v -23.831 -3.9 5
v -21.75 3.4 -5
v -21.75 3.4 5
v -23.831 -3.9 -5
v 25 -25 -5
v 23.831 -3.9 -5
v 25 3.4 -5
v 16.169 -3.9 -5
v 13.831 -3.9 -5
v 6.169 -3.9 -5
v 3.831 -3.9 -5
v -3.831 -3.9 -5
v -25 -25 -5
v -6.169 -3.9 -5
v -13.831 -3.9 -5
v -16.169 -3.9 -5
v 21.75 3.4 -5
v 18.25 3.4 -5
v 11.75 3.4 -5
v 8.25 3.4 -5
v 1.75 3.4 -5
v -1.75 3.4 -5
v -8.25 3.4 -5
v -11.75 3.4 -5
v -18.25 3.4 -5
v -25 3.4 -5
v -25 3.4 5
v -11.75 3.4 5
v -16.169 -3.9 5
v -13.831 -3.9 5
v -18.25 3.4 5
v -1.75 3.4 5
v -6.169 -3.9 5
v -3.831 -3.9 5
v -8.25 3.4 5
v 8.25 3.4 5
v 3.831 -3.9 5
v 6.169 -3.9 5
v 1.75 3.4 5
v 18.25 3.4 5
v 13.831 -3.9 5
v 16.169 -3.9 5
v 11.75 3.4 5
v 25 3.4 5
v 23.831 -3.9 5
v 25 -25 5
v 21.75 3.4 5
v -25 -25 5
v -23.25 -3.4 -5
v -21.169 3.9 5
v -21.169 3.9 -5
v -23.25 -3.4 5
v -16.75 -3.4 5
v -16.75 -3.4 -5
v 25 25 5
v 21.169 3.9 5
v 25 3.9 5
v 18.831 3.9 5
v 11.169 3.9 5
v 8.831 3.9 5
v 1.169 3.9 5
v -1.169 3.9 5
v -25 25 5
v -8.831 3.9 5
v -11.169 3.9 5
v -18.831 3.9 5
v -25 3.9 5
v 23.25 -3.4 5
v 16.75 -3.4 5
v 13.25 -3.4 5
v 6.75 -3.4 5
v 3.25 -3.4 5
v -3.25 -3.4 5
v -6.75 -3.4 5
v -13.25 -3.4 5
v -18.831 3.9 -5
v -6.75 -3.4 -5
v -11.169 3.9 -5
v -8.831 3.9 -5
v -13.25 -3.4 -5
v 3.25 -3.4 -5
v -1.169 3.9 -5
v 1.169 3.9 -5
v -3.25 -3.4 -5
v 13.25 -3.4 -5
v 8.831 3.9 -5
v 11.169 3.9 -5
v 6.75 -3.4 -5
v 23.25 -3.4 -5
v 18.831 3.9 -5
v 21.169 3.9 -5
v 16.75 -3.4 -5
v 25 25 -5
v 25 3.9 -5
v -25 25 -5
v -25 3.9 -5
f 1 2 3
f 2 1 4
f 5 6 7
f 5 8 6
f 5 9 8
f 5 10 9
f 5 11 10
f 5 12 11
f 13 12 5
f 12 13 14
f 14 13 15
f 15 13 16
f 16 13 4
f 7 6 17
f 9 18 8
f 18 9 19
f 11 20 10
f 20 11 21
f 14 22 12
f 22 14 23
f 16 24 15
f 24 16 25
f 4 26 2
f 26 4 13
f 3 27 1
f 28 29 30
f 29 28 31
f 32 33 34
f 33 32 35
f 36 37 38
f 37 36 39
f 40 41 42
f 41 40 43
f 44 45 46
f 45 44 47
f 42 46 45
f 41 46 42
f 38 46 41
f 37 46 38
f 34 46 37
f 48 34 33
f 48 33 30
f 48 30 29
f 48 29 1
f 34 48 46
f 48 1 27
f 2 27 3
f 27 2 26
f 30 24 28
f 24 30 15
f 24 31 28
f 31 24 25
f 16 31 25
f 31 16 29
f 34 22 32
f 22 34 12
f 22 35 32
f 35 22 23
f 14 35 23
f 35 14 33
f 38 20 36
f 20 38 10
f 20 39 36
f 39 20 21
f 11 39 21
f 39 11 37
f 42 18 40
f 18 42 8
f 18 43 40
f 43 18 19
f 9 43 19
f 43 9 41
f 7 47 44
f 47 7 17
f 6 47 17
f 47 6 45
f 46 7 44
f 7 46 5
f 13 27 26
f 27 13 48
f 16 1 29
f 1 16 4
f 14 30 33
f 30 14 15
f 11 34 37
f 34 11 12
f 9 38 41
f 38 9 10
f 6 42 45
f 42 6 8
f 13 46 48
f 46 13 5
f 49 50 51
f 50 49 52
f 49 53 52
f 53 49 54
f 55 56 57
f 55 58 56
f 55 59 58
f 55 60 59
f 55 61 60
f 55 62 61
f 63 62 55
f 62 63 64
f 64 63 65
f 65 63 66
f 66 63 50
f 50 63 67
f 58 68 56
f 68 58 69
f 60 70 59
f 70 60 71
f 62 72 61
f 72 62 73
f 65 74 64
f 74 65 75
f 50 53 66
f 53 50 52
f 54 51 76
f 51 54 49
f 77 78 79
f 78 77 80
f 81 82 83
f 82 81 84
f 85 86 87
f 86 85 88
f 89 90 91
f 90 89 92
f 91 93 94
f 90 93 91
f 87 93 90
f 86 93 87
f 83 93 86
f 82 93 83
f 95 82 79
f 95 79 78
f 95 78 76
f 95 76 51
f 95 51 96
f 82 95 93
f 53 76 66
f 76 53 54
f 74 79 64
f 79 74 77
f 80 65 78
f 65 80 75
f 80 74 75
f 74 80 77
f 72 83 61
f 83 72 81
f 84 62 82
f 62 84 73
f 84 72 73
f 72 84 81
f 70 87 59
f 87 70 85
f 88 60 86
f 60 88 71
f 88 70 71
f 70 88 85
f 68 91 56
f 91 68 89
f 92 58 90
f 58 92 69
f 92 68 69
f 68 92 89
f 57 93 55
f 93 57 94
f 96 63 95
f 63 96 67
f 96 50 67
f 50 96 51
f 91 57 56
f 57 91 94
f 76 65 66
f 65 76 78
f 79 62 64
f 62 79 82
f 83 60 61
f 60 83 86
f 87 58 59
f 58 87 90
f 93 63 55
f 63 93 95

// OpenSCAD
// file: dovetail.scad
/**
 *  Dovetail parametric generator for OpenScad
 *  Générateur de queue d'aronde pour OpenScad
 *
 *  Copyright (c) 2012 Charles Rincheval.  All rights reserved.
 *
 *  This library is free software; you can redistribute it and/or
 *  modify it under the terms of the GNU Lesser General Public
 *  License as published by the Free Software Foundation; either
 *  version 2.1 of the License, or (at your option) any later version.
 *
 *  This library is distributed in the hope that it will be useful,
 *  but WITHOUT ANY WARRANTY; without even the implied warranty of
 *  MERCHANTABILITY or FITNESS FOR A PARTICULAR PURPOSE.  See the GNU
 *  Lesser General Public License for more details.
 *
 *  You should have received a copy of the GNU Lesser General Public
 *  License along with this library; if not, write to the Free Software
 *  Foundation, Inc., 51 Franklin St, Fifth Floor, Boston, MA  02110-1301  USA
 *
 *  Last update :
 *  https://github.com/hugokernel/OpenSCAD_Dovetail
 *
 *  http://www.digitalspirit.org/
 */

/**
 *  Create one teeth
 *  @param int width        Teeth width
 *  @param int height       Teeth height
 *  @param int thickness    Teeth thickness
 */
module dovetail_teeth(width, height, thickness) {
    offset = width / 3;
    translate([- width / 2, - height / 2, 0]) {
        linear_extrude(height = thickness) {
            polygon([[0, 0], [width, 0], [width - offset, height], [offset, height]]);
        }
    }
}


/**
 *  Dovetail
 *  @param int  width           Dovetail width
 *  @param int  teeth_count     Teeth count
 *  @param int  teeth_height    Teeth height
 *  @param int  teeth_thickness Teeth thickness
 *  @param int  clear           Teeth clear
 *  @param bool male            Get male (true) or female (false)
 */
module dovetail(width, teeth_count, teeth_height, teeth_thickness, clear=0.1, male=true, debug=false) {

    /**
     * 4 sections :
     *
     * |1/2         1/2|
     * |--+ <- 3 -> +--|--+         +--
     * |   \1  1  1/   |   \       /
     * |    \_____/    |    \_____/
     */

    y = ((width - teeth_count * 2 * clear) / teeth_count) / 4;

    compensation = - 0.1;
    teeth_width = y * 3;

    // Always width / 3 (ref. dovetail_teeth())
    offset = teeth_width / 3;
    start_at = clear * 2 + teeth_width / 2 - width / 2 - clear;

    translate([0, 0, - teeth_thickness / 2]) {

        // Debug purpose only
        if (debug) {
            translate([- width / 2, 0, - width / 2]) {
                %cube(size = [width, 0.01, width]);
            }
        }

        for (i = [-1 : teeth_count * 2 - 1] ) {
            x = start_at + y / 2 + (teeth_width - offset + clear) * i;
            if (i % 2) {
                x = x + 0.1;
                translate([x + compensation, - clear, 0]) {
                    rotate([0, 0, 180]) {
                        if (male == true) {
                            dovetail_teeth(teeth_width - clear, teeth_height - clear, teeth_thickness);
                        }
                    }
                }
            } else {
                translate([x, clear, 0]) {
                    if (male == false) {
                        dovetail_teeth(teeth_width - clear, teeth_height - clear, teeth_thickness);
                    }
                }
            }
        }
    }
}

/**
 *  Cut piece
 *  @param vector position  Cut position ([x, y, z])
 *  @param vector dimension Dimension of bounding box ([w, l, h])
 *  @param vector teeths    Teeths parameters ([count, height, clearance])
 *  @param bool   male      Get male (true) or female (false)
 */
module cutter(position, dimension, teeths, male=true, debug=false) {
    translate(position) {
        dovetail(dimension[0], teeths[0], teeths[1], dimension[2], teeths[2], male, debug);

        if (male) {
            translate([- dimension[0] / 2, - (teeths[1] / 2 - 0.1) - dimension[1], - dimension[2] / 2]) {
                cube(size = dimension);
            }
        } else {
            translate([- dimension[0] / 2, teeths[1] / 2 - 0.1, , - dimension[2] / 2]) {
                cube(size = dimension);
            }
        }
    }
}
// main file
/*  This demo cut a 50x50x10 cube in 2 parts */
use <dovetail.scad>;

/* [Teeth] */

// Teeth count
Teeth_count = 5; // [2:10]

// Teeth height
Teeth_height = 8; // [2:20]

// Teeth clearance
Teeth_clearance = 4; // [1:10]

/* [General] */

// Displayed element choice
Debug_flag = false; // [true:Active, false:Unactive]

// Cube dimension
Cube_dimension = [50, 50, 10];

/**
 * [x, y, z]
 * - x : Teeth count
 * - y : Teeth height
 * - z : Teeth Clearance
 */
teeth = [Teeth_count, Teeth_height, Teeth_clearance / 10];

module amazing_design() {
    cube(size=Cube_dimension, center=true);
}

intersection() {
    amazing_design();
    cutter([0, 0, 0], Cube_dimension, teeth, true, Debug_flag);
}

intersection() {
    amazing_design();
    cutter([0, 0, 0], Cube_dimension, teeth, false, Debug_flag);
}
